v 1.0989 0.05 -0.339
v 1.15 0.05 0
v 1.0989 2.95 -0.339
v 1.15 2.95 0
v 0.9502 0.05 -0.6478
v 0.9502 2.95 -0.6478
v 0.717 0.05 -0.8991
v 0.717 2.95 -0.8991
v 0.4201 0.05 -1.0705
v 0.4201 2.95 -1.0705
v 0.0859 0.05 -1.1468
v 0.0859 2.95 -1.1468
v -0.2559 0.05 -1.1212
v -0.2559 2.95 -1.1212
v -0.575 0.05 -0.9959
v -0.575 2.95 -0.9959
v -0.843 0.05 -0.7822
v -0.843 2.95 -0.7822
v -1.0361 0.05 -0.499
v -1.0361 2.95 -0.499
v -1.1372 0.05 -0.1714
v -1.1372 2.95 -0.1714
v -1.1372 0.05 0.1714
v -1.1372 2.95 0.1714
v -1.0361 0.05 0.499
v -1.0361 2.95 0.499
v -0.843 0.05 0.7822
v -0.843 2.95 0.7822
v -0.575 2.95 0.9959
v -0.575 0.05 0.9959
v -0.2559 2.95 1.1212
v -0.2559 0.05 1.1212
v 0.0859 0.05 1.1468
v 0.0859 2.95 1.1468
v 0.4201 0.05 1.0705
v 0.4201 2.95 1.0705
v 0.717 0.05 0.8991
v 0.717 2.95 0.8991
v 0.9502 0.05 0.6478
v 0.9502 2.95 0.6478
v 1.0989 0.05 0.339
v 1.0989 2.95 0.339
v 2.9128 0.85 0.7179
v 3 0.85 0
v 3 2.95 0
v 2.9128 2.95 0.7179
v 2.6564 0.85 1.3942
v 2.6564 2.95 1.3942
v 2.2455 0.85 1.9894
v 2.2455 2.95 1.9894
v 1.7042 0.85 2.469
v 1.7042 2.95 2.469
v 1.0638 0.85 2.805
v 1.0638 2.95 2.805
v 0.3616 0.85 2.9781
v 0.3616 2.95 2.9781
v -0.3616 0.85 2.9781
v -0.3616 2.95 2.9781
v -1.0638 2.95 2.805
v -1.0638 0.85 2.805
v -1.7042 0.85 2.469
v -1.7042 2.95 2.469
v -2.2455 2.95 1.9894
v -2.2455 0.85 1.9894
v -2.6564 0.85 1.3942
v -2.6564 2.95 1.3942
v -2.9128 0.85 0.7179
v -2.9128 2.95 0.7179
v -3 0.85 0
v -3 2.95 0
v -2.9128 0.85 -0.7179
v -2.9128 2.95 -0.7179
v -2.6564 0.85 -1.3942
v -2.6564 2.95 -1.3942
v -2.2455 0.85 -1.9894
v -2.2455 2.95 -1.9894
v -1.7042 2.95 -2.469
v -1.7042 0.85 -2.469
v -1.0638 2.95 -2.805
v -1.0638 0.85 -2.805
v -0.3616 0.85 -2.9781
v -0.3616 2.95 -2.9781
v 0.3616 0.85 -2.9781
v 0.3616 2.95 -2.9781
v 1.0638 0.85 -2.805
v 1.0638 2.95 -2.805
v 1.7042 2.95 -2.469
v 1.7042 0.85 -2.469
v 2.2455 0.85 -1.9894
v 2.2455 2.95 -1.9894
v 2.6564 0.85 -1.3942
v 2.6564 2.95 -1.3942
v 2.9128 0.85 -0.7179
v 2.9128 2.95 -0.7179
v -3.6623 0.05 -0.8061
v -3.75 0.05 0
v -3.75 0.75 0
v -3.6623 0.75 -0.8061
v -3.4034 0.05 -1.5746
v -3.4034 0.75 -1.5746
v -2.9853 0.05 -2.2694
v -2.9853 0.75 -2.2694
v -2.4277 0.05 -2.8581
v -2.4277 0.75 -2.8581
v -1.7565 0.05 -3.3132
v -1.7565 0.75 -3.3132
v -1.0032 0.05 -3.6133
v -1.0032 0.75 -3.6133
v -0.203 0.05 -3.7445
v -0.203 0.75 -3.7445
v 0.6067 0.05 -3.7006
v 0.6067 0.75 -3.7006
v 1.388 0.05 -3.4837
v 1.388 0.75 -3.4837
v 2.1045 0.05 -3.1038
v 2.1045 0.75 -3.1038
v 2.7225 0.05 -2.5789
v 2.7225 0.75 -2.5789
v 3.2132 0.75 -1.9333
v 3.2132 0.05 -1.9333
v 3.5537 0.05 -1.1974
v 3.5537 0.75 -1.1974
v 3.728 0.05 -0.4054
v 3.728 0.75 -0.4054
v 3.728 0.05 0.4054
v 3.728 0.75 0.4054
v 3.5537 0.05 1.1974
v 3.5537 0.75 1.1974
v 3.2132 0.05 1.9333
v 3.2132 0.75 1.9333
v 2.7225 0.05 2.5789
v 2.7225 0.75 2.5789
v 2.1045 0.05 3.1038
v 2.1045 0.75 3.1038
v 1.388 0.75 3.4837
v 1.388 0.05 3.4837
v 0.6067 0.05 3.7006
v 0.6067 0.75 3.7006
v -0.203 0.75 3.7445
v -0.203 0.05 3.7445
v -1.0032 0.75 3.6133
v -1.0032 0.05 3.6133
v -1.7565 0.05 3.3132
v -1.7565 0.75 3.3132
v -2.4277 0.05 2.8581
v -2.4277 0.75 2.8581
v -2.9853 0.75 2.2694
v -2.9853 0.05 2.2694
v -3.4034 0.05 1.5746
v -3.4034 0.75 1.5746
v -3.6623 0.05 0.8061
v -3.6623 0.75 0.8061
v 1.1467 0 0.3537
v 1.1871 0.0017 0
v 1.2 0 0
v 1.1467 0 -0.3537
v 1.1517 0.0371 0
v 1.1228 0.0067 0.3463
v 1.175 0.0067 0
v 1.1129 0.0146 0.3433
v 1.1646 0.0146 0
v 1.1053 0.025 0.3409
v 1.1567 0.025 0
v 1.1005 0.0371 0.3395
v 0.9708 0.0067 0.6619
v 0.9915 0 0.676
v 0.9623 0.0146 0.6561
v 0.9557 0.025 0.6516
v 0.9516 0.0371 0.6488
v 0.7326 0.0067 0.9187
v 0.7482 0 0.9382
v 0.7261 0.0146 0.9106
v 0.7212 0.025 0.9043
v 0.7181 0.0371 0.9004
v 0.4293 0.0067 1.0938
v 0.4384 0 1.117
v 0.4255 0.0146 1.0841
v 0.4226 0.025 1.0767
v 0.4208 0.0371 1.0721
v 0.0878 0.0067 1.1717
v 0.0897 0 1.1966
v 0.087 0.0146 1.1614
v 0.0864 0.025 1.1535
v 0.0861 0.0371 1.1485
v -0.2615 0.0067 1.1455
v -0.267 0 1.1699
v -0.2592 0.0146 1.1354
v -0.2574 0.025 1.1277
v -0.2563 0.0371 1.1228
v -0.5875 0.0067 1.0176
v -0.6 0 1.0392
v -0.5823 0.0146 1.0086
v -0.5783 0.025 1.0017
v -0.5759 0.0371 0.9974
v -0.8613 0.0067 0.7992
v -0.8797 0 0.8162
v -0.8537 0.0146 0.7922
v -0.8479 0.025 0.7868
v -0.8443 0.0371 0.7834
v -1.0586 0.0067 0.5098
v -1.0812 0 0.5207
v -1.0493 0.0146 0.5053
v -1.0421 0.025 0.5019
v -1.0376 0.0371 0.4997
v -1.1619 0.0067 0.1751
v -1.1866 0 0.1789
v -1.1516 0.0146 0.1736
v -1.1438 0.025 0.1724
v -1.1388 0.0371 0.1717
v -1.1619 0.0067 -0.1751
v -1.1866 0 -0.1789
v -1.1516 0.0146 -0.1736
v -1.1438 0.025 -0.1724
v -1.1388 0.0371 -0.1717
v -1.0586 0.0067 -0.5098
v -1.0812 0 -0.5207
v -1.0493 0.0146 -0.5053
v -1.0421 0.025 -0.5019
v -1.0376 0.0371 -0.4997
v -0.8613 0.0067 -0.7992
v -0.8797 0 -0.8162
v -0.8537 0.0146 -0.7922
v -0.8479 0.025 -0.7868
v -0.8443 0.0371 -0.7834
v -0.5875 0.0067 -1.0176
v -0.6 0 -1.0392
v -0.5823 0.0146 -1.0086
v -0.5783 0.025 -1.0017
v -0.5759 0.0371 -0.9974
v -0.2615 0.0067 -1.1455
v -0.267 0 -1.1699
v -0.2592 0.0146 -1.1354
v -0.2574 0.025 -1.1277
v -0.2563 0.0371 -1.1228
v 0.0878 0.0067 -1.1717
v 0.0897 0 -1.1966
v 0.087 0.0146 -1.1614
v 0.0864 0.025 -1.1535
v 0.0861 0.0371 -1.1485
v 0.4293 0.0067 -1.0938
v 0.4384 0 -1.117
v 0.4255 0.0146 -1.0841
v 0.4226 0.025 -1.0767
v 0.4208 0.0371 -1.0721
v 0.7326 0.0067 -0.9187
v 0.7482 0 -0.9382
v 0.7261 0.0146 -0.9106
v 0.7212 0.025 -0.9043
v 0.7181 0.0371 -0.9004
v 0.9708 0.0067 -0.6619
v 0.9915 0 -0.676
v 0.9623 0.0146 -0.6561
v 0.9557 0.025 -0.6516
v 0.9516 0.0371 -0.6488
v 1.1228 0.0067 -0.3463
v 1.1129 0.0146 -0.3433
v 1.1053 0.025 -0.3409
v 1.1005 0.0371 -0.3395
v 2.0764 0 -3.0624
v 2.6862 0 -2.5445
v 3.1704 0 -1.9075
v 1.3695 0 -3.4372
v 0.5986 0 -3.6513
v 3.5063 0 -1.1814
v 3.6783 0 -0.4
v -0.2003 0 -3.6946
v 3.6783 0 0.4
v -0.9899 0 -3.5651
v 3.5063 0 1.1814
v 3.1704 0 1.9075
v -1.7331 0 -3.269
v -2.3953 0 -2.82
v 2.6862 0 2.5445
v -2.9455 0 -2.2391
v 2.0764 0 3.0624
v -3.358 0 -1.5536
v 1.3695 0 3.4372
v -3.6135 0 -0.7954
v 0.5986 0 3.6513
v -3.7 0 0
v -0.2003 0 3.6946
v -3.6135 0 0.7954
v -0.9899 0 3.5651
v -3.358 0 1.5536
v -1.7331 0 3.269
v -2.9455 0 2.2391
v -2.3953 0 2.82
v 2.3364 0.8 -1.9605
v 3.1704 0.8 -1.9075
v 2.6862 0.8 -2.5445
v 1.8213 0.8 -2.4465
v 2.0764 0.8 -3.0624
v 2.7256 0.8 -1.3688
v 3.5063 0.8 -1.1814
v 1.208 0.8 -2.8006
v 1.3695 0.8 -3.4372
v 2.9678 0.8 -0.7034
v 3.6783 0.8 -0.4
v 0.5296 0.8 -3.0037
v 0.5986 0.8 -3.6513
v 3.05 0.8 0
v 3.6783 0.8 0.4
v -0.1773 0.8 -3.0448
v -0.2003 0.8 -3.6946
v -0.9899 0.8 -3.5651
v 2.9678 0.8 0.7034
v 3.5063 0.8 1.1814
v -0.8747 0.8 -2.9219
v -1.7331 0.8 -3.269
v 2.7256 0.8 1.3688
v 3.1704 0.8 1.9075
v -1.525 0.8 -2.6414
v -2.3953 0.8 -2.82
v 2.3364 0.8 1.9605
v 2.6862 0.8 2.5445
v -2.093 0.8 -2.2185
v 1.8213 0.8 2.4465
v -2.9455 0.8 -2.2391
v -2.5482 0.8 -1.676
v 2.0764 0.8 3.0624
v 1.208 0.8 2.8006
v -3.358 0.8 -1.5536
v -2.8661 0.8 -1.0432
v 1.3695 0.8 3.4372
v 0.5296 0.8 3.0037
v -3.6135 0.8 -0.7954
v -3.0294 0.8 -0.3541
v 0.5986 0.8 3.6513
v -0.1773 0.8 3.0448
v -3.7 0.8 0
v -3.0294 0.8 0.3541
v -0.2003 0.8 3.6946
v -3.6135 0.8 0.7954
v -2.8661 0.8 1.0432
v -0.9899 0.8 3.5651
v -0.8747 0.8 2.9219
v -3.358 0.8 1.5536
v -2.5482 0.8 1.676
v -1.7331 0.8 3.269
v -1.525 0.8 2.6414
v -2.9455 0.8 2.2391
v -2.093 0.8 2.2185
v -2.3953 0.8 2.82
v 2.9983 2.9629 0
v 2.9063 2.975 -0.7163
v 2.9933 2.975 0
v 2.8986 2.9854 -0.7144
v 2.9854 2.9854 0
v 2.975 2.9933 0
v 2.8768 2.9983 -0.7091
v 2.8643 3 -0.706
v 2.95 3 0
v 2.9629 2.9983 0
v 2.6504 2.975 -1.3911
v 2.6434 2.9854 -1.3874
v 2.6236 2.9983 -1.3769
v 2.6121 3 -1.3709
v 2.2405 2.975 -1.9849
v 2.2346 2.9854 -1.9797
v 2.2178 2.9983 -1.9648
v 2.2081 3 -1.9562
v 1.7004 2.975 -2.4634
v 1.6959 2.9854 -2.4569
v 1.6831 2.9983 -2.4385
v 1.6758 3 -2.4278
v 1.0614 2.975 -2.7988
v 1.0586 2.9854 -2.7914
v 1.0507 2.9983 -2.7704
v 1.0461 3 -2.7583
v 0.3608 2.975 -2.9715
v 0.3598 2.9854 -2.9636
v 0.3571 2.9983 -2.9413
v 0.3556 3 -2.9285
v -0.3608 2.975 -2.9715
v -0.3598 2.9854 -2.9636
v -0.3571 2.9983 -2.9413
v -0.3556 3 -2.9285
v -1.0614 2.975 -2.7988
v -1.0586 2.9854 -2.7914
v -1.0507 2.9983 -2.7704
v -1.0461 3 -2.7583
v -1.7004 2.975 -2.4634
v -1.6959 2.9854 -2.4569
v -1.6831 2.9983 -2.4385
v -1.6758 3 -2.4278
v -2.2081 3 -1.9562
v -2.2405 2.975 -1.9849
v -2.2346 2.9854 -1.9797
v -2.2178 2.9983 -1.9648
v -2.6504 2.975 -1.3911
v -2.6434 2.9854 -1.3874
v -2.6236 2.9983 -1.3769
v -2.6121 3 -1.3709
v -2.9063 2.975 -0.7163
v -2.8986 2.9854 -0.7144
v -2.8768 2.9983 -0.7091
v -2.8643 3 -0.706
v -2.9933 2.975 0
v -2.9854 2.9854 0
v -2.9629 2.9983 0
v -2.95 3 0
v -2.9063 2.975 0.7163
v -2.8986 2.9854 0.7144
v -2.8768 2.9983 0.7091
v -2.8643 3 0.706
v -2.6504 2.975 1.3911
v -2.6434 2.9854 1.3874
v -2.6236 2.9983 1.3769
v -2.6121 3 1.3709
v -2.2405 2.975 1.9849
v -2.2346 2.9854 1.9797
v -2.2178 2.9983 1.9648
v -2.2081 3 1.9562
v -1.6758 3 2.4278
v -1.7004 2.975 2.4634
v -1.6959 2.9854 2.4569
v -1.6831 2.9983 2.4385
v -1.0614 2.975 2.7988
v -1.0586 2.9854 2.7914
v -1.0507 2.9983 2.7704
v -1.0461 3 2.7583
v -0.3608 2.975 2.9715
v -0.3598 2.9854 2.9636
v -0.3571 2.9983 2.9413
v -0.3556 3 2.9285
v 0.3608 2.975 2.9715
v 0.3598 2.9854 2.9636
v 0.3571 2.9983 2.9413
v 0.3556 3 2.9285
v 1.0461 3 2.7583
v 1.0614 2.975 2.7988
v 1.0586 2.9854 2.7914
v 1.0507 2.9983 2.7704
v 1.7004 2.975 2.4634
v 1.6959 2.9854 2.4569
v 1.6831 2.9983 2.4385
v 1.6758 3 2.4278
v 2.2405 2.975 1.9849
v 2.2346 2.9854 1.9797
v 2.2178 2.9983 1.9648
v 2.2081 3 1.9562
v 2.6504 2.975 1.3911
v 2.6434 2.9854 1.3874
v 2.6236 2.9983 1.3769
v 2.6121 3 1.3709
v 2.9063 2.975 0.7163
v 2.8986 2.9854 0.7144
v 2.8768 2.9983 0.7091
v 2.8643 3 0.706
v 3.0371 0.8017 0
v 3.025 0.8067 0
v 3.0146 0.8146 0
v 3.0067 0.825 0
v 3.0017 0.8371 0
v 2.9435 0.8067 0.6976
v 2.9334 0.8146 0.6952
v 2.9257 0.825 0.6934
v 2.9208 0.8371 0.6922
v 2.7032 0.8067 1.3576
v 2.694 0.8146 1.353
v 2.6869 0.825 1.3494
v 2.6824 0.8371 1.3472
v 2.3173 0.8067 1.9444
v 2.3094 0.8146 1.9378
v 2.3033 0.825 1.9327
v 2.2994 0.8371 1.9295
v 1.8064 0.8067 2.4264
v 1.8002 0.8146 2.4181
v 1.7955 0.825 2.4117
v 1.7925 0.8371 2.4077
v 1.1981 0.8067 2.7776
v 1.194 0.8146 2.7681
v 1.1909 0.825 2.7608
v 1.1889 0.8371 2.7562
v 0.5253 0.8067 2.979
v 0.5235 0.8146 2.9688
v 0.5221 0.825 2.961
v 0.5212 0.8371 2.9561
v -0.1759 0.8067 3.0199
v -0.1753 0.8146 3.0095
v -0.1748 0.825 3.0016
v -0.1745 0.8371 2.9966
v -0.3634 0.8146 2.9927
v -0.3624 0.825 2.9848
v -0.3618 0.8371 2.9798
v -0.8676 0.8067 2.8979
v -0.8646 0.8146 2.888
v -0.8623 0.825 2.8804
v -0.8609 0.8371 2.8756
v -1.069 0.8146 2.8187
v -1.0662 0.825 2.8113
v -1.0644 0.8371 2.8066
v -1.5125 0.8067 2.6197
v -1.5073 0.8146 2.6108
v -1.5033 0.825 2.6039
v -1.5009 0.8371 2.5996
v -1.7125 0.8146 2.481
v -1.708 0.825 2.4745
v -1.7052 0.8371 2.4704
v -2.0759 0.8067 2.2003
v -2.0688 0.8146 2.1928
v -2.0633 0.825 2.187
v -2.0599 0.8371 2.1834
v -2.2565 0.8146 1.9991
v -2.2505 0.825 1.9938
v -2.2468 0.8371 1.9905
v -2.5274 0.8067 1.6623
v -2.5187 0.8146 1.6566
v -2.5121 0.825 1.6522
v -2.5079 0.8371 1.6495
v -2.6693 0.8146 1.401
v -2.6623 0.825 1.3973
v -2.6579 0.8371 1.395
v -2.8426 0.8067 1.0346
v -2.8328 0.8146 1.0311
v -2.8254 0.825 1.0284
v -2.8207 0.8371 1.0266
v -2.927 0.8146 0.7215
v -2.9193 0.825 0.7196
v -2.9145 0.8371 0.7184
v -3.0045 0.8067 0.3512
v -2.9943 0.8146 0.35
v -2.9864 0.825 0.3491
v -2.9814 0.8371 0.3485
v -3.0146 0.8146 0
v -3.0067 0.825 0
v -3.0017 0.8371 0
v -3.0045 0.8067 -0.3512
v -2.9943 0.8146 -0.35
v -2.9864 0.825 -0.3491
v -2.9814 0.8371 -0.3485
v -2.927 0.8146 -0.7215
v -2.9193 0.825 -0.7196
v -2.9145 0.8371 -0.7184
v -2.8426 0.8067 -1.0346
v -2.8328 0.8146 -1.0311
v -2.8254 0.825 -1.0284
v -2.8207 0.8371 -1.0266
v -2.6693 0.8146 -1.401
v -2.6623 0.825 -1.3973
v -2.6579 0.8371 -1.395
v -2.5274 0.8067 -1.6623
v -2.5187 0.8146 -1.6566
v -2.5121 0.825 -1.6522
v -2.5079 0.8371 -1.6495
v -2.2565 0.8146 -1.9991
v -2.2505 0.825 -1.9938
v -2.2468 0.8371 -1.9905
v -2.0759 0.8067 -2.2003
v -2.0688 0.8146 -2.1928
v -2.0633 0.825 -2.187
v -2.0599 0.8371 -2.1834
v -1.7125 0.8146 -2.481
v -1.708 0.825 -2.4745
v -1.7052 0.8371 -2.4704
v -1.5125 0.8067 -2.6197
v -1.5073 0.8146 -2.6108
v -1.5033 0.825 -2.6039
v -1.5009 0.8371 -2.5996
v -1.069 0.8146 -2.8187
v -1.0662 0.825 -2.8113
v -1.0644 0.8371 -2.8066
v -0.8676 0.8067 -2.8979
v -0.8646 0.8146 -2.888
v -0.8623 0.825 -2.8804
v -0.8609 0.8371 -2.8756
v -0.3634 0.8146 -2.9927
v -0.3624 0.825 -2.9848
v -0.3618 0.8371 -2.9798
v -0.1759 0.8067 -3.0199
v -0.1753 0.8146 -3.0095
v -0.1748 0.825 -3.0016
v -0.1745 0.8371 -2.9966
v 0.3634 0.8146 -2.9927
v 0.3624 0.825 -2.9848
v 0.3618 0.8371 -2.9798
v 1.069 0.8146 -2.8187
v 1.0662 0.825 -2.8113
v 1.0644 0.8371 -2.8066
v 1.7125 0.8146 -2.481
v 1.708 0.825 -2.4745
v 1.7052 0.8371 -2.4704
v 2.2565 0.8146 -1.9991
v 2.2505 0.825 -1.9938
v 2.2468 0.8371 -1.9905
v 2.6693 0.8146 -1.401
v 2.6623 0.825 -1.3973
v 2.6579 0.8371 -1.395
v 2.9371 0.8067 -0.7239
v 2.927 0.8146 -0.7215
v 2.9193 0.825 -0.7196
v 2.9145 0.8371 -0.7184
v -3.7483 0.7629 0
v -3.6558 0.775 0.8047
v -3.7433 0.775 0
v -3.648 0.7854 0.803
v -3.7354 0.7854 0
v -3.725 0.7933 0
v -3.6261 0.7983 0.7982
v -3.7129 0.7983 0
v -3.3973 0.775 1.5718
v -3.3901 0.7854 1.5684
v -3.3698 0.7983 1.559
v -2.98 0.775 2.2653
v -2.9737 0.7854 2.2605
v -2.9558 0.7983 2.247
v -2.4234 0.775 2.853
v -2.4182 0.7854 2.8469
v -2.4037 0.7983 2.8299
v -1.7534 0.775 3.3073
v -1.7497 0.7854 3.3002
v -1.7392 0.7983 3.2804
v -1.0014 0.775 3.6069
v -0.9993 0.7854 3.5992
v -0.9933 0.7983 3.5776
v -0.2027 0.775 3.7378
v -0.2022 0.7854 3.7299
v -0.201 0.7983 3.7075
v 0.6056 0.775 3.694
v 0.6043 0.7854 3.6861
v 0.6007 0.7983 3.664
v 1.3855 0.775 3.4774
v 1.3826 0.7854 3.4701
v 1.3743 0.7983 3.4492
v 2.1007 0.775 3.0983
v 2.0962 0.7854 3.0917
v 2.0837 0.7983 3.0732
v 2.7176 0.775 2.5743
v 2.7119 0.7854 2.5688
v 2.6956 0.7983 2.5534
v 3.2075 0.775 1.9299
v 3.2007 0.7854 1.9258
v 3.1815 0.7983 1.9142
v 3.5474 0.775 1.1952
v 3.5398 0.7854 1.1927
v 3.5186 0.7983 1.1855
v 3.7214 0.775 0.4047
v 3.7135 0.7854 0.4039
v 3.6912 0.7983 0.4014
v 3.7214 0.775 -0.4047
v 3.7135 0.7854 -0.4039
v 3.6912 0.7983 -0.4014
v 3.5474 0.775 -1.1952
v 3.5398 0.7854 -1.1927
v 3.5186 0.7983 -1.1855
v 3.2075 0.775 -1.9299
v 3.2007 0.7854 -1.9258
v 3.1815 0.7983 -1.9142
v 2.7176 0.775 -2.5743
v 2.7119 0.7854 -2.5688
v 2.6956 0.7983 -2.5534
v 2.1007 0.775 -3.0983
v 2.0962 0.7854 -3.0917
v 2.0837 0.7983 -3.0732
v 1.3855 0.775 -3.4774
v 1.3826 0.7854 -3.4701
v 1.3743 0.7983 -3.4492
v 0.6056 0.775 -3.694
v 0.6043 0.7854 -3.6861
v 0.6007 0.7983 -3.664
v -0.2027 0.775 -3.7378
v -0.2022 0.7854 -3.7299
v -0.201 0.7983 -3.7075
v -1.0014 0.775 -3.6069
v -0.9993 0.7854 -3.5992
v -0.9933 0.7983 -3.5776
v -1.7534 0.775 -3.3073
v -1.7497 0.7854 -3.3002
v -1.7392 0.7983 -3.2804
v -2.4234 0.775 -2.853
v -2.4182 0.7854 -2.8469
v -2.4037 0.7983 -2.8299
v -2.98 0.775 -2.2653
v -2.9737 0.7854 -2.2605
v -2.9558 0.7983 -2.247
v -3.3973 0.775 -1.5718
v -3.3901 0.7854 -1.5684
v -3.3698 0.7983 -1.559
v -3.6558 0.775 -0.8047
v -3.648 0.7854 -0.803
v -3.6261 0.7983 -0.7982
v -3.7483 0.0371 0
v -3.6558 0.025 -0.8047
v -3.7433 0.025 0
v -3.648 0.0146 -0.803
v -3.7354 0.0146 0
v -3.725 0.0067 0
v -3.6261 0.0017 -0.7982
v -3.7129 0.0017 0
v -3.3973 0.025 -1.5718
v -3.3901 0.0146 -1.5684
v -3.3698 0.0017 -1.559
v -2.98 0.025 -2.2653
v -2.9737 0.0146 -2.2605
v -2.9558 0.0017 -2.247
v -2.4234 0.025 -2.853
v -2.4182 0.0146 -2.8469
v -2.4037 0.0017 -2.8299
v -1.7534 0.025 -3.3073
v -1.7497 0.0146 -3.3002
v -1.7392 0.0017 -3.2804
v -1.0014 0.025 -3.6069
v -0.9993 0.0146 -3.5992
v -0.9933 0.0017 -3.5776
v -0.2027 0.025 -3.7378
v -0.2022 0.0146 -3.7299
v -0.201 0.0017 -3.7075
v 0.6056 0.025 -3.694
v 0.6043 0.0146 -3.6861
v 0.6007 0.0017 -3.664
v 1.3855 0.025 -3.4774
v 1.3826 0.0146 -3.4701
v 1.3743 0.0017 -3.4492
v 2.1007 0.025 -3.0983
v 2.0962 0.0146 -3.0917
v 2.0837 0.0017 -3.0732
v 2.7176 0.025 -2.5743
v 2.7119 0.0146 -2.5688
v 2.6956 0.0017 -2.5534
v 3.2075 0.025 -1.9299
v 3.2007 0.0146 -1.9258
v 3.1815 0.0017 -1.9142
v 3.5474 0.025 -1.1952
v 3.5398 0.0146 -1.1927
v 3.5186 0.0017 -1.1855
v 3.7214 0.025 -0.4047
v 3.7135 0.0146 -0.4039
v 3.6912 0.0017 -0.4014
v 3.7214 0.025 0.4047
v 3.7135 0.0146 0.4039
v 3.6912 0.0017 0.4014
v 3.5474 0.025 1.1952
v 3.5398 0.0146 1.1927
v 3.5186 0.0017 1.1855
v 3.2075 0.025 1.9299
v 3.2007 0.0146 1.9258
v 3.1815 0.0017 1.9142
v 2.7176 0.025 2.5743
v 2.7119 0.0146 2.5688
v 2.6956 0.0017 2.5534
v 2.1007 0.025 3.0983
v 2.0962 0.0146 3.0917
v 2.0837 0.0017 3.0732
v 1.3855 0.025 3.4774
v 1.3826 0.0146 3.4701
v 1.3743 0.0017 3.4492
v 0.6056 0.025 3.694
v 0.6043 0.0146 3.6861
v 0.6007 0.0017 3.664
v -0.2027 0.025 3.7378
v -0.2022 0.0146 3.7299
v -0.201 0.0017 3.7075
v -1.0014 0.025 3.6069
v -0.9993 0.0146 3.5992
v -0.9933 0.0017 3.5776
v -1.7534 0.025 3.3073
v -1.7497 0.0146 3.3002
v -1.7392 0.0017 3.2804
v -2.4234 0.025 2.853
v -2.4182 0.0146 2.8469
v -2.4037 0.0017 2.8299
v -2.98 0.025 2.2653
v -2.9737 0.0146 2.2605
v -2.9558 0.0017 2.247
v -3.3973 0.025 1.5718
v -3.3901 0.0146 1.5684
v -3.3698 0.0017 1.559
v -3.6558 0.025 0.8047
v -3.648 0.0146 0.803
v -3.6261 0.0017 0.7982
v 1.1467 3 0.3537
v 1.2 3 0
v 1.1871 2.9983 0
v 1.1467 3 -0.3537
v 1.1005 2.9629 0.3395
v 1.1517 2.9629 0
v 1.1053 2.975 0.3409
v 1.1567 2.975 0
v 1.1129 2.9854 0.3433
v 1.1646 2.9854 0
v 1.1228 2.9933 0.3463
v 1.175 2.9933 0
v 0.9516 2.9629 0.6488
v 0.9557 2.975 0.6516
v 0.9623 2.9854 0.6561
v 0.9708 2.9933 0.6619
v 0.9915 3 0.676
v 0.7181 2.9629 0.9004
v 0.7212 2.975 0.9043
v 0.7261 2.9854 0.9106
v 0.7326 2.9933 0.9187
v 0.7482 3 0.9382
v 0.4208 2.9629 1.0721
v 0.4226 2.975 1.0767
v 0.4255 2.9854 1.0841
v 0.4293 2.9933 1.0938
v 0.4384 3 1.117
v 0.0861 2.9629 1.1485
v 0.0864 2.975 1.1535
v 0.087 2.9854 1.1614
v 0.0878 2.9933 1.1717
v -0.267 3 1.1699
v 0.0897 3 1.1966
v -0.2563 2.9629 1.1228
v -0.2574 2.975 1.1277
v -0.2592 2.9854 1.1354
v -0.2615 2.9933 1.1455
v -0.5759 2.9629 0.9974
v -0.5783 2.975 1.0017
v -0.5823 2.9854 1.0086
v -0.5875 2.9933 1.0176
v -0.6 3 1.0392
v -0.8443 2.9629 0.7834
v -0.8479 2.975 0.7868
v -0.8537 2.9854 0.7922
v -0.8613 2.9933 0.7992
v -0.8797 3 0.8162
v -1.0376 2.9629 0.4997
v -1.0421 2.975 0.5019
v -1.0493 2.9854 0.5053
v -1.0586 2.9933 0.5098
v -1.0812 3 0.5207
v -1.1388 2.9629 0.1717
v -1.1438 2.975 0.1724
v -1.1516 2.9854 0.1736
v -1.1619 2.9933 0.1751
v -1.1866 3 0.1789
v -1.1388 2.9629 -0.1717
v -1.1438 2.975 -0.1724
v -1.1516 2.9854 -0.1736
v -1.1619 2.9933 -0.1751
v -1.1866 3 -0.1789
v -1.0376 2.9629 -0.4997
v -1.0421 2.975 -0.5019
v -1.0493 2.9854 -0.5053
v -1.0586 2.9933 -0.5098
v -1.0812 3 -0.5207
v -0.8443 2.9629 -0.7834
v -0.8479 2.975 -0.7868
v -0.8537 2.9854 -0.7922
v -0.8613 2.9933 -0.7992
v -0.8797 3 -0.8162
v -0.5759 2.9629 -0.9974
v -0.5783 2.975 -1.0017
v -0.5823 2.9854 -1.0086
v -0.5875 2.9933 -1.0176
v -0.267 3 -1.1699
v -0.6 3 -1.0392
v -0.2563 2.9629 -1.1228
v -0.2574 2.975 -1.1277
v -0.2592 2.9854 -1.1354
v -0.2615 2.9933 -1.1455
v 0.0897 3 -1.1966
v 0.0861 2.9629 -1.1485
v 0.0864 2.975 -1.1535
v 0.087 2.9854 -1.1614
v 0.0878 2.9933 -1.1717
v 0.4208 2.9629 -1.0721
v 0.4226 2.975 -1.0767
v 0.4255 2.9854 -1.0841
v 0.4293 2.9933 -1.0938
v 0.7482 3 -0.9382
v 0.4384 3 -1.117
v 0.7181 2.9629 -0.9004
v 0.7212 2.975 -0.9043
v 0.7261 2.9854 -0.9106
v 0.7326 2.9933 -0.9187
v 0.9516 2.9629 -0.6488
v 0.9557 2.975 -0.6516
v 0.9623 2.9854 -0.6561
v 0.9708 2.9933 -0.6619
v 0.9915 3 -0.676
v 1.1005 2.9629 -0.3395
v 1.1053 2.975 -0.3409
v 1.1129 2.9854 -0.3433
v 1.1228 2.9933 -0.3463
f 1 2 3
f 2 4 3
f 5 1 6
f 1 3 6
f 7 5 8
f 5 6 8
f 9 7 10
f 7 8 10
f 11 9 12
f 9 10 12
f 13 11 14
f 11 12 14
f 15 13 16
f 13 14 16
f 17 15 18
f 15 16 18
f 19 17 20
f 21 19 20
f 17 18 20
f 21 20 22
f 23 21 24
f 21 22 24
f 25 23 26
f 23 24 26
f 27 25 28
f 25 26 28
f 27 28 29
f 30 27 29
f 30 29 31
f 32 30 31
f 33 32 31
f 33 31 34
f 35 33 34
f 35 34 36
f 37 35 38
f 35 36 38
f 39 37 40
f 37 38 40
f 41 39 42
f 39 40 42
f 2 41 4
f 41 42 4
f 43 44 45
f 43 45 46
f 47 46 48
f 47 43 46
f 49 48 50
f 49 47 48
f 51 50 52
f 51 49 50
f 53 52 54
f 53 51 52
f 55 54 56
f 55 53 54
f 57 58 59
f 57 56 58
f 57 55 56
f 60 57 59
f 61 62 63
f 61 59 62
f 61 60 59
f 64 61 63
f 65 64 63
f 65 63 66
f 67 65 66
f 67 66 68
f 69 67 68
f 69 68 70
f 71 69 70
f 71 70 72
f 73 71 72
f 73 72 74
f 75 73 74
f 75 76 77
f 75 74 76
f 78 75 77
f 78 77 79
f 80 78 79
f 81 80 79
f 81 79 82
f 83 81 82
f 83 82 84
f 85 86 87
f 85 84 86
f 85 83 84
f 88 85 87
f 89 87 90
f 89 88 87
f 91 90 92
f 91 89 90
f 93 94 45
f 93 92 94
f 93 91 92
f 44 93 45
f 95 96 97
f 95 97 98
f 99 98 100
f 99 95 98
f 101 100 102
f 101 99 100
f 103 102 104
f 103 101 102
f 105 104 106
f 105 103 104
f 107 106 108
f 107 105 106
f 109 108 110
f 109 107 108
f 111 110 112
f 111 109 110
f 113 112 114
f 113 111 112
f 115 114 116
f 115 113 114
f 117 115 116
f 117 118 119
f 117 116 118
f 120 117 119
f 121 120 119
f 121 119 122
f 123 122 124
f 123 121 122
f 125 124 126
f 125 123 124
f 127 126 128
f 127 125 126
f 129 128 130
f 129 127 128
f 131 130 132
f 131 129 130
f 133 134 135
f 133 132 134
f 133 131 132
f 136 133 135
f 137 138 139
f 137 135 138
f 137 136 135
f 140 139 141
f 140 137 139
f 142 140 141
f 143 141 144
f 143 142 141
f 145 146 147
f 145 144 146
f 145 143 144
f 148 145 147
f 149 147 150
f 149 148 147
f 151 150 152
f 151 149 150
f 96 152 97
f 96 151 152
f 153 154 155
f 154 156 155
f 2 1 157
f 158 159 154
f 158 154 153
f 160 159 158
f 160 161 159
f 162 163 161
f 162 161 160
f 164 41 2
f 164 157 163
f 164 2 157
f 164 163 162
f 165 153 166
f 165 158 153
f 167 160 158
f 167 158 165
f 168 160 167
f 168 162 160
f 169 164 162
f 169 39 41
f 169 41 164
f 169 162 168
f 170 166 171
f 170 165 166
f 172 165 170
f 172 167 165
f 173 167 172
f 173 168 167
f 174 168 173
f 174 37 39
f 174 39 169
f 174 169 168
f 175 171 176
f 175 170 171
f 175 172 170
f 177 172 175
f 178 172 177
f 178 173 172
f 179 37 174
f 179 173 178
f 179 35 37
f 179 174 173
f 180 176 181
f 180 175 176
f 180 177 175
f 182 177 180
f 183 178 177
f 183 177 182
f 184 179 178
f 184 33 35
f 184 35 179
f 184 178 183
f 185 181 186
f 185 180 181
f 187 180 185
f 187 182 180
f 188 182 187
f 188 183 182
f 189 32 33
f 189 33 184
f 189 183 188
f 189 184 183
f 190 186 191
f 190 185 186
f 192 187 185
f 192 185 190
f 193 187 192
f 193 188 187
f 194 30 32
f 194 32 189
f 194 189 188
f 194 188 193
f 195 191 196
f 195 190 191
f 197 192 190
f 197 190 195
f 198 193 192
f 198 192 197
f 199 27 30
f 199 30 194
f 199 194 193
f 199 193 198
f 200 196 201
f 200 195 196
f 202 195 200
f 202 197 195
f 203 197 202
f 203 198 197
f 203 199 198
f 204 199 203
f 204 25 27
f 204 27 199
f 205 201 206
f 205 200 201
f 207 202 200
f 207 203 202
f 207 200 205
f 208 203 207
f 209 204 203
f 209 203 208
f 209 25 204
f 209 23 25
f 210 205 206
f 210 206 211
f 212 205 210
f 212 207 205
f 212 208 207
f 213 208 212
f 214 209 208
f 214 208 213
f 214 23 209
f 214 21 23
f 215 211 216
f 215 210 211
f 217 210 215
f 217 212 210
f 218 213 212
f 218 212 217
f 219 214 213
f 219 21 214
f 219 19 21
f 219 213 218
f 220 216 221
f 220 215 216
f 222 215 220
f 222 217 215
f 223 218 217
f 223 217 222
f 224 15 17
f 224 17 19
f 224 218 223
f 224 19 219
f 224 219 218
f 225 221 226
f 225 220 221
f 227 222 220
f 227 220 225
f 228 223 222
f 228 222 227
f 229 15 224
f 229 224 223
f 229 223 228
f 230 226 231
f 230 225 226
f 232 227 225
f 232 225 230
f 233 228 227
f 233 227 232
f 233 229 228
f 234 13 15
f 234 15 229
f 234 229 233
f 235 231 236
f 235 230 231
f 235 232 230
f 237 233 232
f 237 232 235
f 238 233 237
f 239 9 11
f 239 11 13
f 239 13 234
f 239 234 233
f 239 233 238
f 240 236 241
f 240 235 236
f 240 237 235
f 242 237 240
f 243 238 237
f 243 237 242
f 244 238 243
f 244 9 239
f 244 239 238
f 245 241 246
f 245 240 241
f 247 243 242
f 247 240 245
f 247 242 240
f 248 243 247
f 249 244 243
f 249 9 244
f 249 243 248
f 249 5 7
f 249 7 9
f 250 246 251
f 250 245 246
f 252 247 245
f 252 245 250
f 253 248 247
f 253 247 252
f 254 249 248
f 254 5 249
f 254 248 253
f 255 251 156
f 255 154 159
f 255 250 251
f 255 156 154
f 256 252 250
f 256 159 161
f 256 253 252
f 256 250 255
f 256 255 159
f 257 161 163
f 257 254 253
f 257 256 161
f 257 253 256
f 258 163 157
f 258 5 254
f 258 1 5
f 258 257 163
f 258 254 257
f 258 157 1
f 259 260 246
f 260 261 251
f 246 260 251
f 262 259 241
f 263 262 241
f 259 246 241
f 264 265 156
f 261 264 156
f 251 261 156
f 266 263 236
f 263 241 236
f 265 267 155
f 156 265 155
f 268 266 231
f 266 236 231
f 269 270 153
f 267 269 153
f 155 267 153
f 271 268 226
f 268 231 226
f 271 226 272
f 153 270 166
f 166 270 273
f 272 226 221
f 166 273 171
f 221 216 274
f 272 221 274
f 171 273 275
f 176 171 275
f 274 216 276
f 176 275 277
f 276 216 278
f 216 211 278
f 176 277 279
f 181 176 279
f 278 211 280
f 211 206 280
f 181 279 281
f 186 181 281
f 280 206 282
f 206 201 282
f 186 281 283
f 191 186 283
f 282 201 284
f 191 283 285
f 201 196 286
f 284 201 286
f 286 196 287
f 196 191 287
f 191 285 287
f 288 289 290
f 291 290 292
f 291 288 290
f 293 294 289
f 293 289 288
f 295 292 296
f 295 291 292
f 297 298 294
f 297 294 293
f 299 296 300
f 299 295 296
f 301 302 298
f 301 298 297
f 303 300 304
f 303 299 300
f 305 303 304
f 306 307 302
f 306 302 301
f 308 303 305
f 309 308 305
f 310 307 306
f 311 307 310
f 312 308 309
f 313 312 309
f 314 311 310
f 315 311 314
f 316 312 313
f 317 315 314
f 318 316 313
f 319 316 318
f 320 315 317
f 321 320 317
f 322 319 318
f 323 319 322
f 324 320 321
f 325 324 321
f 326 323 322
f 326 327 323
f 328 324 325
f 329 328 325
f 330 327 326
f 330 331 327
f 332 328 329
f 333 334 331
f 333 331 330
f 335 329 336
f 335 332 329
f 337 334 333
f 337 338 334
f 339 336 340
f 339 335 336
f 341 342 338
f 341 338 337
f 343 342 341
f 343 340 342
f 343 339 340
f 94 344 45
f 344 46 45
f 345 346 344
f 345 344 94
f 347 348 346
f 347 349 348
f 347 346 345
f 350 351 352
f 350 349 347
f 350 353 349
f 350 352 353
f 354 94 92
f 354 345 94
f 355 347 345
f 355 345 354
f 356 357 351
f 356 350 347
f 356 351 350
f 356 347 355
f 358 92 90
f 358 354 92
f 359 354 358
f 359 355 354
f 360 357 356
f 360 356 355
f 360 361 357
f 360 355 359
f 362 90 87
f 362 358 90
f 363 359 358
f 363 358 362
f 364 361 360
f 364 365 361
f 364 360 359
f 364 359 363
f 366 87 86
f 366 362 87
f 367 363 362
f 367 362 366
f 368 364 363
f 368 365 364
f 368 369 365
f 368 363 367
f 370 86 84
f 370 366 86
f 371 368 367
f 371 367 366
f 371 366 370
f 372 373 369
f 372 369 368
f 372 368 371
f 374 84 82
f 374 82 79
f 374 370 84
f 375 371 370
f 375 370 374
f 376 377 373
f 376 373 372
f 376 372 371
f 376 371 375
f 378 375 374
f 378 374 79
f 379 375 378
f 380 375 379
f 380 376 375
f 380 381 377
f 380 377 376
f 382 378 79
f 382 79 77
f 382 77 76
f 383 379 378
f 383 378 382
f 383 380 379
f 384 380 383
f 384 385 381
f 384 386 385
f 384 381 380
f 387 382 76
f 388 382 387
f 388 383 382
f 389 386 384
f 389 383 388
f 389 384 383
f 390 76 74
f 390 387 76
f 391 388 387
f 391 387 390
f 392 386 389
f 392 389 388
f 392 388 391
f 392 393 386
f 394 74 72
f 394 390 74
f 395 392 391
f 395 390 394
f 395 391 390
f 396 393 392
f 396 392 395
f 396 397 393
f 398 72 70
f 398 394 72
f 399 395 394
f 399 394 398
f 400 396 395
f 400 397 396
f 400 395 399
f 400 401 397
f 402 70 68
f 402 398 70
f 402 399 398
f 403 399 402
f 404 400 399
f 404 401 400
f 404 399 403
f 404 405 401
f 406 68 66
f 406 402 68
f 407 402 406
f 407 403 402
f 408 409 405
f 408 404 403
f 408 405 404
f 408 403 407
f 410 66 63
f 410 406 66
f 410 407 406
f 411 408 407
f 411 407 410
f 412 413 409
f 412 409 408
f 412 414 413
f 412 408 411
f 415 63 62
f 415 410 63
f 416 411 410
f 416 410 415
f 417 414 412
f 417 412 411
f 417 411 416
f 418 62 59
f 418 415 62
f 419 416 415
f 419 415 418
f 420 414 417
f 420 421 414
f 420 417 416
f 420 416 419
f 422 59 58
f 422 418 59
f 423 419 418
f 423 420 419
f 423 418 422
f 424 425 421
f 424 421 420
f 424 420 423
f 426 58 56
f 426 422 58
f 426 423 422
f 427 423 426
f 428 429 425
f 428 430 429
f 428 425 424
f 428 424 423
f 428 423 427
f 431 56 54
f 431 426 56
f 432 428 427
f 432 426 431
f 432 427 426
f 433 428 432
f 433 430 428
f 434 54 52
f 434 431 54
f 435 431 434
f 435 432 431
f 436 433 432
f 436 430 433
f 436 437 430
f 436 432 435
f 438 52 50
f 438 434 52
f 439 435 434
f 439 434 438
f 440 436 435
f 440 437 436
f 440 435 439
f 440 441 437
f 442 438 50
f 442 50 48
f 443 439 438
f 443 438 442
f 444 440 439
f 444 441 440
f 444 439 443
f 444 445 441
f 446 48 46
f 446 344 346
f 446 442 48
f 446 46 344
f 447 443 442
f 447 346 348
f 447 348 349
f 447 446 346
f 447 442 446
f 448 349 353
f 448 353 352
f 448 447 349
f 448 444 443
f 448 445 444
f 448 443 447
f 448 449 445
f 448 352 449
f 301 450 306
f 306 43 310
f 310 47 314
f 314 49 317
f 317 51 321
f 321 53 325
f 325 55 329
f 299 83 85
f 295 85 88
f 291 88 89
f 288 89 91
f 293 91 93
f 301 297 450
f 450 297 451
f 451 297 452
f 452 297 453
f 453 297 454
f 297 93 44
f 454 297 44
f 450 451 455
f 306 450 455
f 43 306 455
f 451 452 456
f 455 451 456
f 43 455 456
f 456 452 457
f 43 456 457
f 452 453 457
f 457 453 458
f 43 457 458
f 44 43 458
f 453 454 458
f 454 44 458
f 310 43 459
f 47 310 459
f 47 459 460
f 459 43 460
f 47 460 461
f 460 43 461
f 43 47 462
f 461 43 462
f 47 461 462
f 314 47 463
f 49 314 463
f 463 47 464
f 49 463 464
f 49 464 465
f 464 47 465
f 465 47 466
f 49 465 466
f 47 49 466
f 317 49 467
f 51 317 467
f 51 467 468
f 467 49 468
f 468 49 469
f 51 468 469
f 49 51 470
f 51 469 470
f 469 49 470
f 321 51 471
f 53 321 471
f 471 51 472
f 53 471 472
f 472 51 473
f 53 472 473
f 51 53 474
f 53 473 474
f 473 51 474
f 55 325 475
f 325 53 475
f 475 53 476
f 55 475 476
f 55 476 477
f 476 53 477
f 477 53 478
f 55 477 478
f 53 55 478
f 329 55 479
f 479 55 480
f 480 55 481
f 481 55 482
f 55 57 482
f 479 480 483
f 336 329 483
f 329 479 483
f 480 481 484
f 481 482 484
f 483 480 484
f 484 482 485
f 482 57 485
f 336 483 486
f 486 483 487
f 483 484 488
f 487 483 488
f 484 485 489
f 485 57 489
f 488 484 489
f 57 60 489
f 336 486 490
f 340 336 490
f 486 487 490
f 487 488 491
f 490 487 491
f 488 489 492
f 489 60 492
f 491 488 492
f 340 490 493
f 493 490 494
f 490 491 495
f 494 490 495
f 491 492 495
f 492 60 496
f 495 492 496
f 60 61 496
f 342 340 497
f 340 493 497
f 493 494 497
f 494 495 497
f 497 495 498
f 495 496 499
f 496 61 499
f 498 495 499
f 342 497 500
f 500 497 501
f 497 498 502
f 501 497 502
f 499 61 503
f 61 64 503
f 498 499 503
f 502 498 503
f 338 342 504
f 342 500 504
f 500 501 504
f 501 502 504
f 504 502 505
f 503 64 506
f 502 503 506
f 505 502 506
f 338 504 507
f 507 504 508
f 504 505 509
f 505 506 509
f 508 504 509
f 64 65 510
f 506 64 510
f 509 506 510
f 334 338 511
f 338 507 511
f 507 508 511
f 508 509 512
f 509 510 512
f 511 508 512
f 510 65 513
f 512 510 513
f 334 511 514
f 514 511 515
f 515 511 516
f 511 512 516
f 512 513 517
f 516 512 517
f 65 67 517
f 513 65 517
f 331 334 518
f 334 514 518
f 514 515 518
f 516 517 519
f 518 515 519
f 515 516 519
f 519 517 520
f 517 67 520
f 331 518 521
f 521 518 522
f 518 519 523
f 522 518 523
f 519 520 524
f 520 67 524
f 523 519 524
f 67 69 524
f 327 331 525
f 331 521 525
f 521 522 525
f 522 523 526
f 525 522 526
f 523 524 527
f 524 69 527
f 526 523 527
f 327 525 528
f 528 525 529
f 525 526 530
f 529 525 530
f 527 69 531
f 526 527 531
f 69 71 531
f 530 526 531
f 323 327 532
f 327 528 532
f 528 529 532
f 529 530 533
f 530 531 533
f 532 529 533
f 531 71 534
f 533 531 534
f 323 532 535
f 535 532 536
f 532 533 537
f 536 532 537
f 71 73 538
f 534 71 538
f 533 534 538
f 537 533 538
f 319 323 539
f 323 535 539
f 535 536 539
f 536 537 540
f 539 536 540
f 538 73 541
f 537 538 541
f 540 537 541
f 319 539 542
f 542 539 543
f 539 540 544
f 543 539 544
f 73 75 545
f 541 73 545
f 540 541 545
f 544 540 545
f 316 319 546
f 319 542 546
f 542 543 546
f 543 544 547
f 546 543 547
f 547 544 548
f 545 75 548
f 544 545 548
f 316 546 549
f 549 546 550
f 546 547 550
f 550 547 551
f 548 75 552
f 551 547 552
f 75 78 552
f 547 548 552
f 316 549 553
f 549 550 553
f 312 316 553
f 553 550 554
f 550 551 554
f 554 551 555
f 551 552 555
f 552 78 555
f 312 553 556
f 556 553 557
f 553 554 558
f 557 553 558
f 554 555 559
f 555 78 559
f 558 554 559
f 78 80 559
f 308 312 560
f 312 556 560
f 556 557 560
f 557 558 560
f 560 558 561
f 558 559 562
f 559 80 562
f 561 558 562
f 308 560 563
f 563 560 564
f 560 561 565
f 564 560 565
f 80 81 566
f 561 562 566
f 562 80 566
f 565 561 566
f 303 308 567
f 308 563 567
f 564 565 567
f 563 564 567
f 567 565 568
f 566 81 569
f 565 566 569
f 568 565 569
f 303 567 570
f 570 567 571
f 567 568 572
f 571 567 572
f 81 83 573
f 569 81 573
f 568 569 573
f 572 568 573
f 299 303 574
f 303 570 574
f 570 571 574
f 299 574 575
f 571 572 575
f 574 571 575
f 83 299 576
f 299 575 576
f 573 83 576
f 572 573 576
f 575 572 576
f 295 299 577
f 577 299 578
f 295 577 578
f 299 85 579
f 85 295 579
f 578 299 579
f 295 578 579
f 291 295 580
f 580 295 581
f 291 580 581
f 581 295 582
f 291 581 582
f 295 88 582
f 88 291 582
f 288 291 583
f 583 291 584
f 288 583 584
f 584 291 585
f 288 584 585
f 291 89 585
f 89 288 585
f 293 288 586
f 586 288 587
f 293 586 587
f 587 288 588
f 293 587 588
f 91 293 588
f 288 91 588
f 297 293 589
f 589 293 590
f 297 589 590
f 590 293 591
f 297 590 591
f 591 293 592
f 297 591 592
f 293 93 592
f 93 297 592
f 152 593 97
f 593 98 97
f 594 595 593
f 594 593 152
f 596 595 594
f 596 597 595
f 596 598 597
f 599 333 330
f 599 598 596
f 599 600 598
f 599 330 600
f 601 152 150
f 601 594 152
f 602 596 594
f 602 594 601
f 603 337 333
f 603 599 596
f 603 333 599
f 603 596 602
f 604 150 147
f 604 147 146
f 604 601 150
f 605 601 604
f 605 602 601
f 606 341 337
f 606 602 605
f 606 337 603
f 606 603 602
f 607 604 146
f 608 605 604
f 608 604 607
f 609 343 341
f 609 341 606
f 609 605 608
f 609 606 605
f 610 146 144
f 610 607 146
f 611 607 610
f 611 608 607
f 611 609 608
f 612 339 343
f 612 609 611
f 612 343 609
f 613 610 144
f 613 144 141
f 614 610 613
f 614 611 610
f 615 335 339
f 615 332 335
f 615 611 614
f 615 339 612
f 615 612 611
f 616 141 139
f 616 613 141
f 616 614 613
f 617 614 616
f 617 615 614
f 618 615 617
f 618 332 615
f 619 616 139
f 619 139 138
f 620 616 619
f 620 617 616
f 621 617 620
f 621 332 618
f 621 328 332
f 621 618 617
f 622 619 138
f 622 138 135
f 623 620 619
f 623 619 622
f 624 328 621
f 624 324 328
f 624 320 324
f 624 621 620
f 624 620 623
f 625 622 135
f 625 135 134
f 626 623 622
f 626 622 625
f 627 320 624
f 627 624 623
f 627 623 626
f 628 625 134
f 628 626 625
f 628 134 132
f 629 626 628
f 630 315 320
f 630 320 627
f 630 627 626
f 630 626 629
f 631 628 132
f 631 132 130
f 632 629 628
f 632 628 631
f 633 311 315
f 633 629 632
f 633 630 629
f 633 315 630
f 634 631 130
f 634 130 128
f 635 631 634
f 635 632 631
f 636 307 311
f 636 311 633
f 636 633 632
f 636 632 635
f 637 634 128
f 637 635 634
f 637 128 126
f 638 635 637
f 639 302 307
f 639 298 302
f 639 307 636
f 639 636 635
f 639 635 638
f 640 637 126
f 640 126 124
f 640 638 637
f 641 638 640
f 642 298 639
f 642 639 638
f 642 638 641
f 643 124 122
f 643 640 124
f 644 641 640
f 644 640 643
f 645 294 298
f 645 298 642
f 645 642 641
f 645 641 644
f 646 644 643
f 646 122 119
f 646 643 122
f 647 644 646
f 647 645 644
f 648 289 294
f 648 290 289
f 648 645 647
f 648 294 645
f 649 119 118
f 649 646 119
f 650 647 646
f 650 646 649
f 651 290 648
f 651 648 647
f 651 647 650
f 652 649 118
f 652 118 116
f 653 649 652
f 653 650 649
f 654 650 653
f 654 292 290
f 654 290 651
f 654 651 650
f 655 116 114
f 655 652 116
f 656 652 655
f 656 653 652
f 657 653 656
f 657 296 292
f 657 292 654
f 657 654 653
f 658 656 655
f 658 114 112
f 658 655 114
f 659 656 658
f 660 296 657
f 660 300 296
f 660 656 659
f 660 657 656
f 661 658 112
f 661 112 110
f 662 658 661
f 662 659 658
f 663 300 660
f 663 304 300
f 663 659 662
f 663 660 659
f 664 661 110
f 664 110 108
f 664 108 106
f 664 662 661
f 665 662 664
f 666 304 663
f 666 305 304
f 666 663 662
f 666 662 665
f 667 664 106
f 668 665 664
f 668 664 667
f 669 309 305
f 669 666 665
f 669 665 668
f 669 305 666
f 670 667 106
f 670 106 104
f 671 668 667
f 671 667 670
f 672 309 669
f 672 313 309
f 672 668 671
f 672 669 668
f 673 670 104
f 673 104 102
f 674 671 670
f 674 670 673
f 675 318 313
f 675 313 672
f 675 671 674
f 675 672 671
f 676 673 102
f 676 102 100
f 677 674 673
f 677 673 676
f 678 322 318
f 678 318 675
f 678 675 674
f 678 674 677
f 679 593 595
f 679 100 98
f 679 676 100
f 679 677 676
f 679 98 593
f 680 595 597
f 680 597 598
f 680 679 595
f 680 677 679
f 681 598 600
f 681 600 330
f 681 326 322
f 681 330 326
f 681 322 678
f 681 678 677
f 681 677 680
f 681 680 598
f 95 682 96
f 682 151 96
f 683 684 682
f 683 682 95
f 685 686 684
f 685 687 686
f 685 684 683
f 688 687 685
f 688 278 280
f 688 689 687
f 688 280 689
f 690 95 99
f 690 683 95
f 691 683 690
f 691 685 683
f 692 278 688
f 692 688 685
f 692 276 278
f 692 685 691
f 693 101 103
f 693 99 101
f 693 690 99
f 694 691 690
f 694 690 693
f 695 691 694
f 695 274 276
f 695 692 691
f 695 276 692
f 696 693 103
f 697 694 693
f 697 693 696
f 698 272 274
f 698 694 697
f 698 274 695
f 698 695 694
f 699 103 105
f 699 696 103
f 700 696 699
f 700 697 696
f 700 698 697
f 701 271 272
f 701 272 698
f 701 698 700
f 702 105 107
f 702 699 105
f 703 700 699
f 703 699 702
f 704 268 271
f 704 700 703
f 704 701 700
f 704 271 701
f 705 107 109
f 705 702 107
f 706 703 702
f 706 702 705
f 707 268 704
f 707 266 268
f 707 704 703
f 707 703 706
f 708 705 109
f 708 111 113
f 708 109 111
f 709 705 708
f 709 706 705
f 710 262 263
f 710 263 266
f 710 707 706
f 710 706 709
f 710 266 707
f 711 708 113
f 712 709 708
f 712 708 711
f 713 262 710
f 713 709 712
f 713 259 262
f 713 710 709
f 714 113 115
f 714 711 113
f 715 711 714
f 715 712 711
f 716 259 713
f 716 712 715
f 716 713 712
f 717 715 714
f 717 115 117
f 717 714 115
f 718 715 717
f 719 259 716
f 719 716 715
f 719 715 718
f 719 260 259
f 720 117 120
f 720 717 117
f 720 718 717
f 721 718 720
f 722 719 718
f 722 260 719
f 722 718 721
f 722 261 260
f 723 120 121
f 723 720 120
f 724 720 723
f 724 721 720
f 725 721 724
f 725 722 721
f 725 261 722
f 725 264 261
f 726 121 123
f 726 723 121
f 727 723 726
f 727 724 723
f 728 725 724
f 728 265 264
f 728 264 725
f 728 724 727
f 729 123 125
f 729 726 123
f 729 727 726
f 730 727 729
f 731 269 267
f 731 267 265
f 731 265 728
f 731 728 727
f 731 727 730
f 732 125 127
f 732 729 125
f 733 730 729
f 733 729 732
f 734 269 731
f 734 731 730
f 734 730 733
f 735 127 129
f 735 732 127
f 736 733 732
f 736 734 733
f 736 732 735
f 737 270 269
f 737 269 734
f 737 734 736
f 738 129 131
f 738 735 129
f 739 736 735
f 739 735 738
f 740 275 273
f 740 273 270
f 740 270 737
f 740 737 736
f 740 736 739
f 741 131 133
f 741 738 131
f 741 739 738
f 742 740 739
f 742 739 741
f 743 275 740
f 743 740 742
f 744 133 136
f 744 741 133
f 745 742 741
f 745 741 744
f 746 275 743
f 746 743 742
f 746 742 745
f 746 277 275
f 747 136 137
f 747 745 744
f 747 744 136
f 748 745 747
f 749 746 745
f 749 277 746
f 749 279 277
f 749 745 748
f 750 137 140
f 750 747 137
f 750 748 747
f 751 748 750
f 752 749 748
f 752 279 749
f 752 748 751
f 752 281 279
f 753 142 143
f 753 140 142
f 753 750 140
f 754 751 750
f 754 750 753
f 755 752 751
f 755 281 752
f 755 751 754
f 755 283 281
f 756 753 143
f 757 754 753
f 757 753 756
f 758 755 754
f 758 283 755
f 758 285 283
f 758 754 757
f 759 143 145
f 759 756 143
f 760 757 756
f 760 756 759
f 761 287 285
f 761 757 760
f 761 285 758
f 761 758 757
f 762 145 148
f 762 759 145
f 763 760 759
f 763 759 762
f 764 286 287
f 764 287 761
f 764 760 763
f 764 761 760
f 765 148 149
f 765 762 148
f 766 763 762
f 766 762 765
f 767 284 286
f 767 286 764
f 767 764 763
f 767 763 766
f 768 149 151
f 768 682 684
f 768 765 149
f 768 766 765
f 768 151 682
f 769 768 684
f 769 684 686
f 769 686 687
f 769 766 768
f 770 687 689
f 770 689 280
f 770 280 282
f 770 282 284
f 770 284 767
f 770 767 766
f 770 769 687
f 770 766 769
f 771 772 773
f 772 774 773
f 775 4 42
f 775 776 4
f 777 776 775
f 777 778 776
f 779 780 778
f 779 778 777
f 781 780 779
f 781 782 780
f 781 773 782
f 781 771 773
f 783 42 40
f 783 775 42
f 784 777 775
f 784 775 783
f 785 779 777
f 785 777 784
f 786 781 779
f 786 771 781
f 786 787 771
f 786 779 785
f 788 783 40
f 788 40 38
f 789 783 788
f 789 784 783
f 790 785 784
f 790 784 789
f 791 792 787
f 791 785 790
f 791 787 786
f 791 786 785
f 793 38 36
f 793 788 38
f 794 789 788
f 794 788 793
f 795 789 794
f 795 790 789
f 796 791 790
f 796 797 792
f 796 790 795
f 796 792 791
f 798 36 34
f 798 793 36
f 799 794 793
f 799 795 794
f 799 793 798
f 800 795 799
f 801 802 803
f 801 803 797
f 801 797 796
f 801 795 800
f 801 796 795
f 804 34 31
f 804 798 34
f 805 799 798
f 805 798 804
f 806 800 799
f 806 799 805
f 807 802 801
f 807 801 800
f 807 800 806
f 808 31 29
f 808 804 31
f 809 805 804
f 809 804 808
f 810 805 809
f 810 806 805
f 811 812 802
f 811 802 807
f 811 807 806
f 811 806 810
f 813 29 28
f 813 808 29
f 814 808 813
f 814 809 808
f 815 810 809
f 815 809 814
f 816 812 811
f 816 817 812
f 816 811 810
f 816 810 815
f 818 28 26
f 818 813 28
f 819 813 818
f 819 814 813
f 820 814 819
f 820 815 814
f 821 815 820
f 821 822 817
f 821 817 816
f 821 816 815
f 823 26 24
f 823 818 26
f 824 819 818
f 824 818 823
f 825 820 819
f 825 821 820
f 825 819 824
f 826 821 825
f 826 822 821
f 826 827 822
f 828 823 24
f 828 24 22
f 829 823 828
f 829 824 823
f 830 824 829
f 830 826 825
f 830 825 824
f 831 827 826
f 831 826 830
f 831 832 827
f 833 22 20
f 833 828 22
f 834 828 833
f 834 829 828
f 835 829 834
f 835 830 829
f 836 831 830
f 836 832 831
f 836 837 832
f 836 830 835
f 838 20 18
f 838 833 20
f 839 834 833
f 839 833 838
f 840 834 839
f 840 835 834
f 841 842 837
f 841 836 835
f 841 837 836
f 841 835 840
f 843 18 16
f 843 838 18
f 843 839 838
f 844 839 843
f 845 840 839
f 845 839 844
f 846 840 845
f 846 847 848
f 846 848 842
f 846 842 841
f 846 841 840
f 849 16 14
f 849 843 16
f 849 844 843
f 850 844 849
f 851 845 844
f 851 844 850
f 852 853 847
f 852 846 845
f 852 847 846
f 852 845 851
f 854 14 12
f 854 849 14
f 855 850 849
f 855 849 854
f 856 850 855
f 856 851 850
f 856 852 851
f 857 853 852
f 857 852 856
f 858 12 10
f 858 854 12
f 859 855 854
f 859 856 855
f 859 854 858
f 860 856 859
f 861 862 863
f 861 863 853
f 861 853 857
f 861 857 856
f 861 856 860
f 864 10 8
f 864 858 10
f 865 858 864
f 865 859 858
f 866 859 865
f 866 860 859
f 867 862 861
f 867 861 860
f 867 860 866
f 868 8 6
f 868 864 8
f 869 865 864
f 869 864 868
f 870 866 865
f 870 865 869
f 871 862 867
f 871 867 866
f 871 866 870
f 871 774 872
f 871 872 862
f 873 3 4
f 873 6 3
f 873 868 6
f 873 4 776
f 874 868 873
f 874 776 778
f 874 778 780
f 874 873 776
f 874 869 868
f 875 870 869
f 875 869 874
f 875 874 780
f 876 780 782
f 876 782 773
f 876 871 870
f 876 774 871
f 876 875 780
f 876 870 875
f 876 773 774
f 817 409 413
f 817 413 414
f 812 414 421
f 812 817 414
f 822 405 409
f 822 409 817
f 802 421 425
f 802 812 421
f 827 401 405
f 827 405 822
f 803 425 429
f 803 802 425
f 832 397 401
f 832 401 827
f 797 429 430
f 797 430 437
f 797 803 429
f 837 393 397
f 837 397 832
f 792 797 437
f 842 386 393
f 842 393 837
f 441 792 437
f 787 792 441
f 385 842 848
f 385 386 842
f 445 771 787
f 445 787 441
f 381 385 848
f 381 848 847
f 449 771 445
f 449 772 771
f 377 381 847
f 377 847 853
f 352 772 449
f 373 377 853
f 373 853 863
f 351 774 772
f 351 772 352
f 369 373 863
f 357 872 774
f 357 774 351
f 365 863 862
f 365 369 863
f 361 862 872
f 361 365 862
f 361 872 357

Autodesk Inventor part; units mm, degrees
ref_plane "YZ Plane" through (0, 0, 0) normal (1, 0, 0) x (0, 1, 0)
ref_plane "XZ Plane" through (0, 0, 0) normal (0, 1, 0) x (-1, 0, 0)
ref_plane "XY Plane" through (0, 0, 0) normal (0, 0, 1) x (1, 0, 0)
sketch "Sketch1" plane through (0, 0, 0) normal (0, 1, 0) x (-1, 0, 0)
  circle A0 centre (0, 0) radius 3.75
  dimension "d0" = 7.5
extrude "Extrusion1" add sketch "Sketch1" along normal blind 0.8
sketch "Sketch2" plane through (0, 0.8, 0) normal (0, 1, 0) x (1, 0, 0)
  circle A0 centre (0, 0) radius 3
  dimension "d3" = 6
extrude "Extrusion2" add sketch "Sketch2" along normal blind 2.2
sketch "Sketch3" plane through (0, 3, 0) normal (0, 1, 0) x (1, 0, 0)
  circle A0 centre (0, 0) radius 1.15
  dimension "d6" = 2.3
extrude "Extrusion3" cut sketch "Sketch3" against normal blind 3.2
fillet "Fillet1" radius 0.05 6 edges at (-3, 3, 0) (-3, 0.8, 0) (3.75, 0.8, 0) (3.75, 0, 0) (-1.15, 3, 0) (-1.15, 0, 0)
properties part number "flangedBearing_2x6x2.3"
